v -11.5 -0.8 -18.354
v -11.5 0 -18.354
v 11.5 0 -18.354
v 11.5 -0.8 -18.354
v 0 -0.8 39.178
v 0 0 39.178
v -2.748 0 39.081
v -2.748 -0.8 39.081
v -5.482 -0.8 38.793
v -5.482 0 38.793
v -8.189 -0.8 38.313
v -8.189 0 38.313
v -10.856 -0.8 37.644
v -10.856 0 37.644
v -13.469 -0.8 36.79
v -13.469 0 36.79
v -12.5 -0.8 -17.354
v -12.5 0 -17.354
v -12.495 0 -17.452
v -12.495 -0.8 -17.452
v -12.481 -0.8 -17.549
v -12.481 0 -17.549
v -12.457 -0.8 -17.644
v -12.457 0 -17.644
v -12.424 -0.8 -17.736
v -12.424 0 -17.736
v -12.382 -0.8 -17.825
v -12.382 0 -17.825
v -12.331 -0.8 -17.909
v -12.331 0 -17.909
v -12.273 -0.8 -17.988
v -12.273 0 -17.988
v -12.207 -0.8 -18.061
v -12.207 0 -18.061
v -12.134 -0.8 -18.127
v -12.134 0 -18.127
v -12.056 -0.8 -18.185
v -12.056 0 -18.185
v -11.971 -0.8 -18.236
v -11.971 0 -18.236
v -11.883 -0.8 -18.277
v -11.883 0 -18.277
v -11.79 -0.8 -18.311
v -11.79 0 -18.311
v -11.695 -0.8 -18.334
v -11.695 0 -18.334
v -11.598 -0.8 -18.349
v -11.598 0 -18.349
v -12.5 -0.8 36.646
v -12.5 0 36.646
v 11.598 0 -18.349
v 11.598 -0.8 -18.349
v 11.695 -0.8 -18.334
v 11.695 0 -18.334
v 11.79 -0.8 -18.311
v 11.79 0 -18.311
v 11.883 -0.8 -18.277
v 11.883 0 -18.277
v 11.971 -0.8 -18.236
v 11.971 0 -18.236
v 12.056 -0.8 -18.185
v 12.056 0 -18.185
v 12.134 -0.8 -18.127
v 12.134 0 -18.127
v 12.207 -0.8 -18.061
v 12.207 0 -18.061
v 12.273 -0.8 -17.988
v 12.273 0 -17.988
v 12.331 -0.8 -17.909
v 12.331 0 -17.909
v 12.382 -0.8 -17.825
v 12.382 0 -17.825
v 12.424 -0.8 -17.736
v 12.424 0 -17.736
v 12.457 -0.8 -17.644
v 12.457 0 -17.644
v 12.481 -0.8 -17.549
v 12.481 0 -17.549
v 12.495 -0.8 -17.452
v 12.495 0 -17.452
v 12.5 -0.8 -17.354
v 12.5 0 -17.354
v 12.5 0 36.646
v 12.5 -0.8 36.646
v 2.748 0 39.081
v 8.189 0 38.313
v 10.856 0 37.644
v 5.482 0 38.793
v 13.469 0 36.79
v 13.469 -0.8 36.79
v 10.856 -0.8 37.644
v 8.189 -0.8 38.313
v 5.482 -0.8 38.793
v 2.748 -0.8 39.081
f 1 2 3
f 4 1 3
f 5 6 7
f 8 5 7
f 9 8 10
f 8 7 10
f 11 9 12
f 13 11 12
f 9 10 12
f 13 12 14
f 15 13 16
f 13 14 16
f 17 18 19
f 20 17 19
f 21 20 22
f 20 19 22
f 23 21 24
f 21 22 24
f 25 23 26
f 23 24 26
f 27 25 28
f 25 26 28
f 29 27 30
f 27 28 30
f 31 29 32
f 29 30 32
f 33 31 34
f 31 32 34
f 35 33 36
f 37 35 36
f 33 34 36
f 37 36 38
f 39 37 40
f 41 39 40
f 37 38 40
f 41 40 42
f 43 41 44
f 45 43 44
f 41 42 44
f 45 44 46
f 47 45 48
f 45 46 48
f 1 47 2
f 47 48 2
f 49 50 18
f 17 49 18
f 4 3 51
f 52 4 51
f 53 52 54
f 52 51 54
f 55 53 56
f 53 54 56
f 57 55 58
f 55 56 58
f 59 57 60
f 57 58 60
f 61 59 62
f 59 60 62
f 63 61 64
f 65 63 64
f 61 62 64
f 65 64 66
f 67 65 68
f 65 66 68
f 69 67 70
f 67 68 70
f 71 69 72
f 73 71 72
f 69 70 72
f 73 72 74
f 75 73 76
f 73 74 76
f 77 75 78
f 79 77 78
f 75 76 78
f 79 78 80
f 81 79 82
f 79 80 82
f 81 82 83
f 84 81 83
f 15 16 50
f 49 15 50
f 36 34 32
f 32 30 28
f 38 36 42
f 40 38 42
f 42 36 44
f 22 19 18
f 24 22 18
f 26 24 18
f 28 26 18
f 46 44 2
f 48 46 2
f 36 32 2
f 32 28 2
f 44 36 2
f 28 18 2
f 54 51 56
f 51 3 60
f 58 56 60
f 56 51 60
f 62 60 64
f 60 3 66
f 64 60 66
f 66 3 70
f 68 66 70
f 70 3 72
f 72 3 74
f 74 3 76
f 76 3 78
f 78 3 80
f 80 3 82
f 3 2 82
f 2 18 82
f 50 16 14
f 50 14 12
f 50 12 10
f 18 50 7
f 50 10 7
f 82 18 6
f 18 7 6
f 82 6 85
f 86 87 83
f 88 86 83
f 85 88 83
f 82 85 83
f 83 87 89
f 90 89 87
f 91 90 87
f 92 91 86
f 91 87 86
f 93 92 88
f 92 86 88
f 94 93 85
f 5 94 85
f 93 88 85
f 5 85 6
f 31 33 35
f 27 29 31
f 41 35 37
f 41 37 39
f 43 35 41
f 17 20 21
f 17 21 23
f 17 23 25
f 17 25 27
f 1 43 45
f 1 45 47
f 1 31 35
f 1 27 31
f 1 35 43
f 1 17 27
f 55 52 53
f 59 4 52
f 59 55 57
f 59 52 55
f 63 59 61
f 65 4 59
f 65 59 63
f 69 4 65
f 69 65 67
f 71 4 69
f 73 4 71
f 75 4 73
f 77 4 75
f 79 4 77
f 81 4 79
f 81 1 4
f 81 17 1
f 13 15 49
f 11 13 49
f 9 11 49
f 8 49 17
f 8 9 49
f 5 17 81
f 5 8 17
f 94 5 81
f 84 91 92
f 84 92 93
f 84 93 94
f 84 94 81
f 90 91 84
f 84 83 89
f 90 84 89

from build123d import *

# Parameters (mm, degrees)
F1_DEPTH = 0.8


with BuildPart() as f1:
    # F0 (on Front) → F1 (new body)
    with BuildSketch(Plane.XZ):
        with BuildLine():
            Line((0, -18.353604), (0, 36.646396))
            Line((0, 36.646396), (-12.5, 36.646396))
            Line((-12.5, 36.646396), (-12.5, -17.353604))
            ThreePointArc((-12.5, -17.353604), (-12.207107, -18.060711), (-11.5, -18.353604))
            Line((-11.5, -18.353604), (0, -18.353604))
        make_face()
        with BuildLine():
            Line((-12.5, 36.646396), (0, 36.646396))
            Line((0, 36.646396), (12.5, 36.646396))
            Line((12.5, 36.646396), (13.469037, 36.789905))
            ThreePointArc((13.469037, 36.789905), (6.839549, 38.576322), (0, 39.177953))
            ThreePointArc((0, 39.177953), (-6.839549, 38.576322), (-13.469037, 36.789905))
            Line((-13.469037, 36.789905), (-12.5, 36.646396))
        make_face()
        with BuildLine():
            Line((12.5, 36.646396), (0, 36.646396))
            Line((0, 36.646396), (0, -18.353604))
            Line((0, -18.353604), (11.5, -18.353604))
            ThreePointArc((11.5, -18.353604), (12.207107, -18.060711), (12.5, -17.353604))
            Line((12.5, -17.353604), (12.5, 36.646396))
        make_face()
    extrude(amount=F1_DEPTH)


solid = f1.part
